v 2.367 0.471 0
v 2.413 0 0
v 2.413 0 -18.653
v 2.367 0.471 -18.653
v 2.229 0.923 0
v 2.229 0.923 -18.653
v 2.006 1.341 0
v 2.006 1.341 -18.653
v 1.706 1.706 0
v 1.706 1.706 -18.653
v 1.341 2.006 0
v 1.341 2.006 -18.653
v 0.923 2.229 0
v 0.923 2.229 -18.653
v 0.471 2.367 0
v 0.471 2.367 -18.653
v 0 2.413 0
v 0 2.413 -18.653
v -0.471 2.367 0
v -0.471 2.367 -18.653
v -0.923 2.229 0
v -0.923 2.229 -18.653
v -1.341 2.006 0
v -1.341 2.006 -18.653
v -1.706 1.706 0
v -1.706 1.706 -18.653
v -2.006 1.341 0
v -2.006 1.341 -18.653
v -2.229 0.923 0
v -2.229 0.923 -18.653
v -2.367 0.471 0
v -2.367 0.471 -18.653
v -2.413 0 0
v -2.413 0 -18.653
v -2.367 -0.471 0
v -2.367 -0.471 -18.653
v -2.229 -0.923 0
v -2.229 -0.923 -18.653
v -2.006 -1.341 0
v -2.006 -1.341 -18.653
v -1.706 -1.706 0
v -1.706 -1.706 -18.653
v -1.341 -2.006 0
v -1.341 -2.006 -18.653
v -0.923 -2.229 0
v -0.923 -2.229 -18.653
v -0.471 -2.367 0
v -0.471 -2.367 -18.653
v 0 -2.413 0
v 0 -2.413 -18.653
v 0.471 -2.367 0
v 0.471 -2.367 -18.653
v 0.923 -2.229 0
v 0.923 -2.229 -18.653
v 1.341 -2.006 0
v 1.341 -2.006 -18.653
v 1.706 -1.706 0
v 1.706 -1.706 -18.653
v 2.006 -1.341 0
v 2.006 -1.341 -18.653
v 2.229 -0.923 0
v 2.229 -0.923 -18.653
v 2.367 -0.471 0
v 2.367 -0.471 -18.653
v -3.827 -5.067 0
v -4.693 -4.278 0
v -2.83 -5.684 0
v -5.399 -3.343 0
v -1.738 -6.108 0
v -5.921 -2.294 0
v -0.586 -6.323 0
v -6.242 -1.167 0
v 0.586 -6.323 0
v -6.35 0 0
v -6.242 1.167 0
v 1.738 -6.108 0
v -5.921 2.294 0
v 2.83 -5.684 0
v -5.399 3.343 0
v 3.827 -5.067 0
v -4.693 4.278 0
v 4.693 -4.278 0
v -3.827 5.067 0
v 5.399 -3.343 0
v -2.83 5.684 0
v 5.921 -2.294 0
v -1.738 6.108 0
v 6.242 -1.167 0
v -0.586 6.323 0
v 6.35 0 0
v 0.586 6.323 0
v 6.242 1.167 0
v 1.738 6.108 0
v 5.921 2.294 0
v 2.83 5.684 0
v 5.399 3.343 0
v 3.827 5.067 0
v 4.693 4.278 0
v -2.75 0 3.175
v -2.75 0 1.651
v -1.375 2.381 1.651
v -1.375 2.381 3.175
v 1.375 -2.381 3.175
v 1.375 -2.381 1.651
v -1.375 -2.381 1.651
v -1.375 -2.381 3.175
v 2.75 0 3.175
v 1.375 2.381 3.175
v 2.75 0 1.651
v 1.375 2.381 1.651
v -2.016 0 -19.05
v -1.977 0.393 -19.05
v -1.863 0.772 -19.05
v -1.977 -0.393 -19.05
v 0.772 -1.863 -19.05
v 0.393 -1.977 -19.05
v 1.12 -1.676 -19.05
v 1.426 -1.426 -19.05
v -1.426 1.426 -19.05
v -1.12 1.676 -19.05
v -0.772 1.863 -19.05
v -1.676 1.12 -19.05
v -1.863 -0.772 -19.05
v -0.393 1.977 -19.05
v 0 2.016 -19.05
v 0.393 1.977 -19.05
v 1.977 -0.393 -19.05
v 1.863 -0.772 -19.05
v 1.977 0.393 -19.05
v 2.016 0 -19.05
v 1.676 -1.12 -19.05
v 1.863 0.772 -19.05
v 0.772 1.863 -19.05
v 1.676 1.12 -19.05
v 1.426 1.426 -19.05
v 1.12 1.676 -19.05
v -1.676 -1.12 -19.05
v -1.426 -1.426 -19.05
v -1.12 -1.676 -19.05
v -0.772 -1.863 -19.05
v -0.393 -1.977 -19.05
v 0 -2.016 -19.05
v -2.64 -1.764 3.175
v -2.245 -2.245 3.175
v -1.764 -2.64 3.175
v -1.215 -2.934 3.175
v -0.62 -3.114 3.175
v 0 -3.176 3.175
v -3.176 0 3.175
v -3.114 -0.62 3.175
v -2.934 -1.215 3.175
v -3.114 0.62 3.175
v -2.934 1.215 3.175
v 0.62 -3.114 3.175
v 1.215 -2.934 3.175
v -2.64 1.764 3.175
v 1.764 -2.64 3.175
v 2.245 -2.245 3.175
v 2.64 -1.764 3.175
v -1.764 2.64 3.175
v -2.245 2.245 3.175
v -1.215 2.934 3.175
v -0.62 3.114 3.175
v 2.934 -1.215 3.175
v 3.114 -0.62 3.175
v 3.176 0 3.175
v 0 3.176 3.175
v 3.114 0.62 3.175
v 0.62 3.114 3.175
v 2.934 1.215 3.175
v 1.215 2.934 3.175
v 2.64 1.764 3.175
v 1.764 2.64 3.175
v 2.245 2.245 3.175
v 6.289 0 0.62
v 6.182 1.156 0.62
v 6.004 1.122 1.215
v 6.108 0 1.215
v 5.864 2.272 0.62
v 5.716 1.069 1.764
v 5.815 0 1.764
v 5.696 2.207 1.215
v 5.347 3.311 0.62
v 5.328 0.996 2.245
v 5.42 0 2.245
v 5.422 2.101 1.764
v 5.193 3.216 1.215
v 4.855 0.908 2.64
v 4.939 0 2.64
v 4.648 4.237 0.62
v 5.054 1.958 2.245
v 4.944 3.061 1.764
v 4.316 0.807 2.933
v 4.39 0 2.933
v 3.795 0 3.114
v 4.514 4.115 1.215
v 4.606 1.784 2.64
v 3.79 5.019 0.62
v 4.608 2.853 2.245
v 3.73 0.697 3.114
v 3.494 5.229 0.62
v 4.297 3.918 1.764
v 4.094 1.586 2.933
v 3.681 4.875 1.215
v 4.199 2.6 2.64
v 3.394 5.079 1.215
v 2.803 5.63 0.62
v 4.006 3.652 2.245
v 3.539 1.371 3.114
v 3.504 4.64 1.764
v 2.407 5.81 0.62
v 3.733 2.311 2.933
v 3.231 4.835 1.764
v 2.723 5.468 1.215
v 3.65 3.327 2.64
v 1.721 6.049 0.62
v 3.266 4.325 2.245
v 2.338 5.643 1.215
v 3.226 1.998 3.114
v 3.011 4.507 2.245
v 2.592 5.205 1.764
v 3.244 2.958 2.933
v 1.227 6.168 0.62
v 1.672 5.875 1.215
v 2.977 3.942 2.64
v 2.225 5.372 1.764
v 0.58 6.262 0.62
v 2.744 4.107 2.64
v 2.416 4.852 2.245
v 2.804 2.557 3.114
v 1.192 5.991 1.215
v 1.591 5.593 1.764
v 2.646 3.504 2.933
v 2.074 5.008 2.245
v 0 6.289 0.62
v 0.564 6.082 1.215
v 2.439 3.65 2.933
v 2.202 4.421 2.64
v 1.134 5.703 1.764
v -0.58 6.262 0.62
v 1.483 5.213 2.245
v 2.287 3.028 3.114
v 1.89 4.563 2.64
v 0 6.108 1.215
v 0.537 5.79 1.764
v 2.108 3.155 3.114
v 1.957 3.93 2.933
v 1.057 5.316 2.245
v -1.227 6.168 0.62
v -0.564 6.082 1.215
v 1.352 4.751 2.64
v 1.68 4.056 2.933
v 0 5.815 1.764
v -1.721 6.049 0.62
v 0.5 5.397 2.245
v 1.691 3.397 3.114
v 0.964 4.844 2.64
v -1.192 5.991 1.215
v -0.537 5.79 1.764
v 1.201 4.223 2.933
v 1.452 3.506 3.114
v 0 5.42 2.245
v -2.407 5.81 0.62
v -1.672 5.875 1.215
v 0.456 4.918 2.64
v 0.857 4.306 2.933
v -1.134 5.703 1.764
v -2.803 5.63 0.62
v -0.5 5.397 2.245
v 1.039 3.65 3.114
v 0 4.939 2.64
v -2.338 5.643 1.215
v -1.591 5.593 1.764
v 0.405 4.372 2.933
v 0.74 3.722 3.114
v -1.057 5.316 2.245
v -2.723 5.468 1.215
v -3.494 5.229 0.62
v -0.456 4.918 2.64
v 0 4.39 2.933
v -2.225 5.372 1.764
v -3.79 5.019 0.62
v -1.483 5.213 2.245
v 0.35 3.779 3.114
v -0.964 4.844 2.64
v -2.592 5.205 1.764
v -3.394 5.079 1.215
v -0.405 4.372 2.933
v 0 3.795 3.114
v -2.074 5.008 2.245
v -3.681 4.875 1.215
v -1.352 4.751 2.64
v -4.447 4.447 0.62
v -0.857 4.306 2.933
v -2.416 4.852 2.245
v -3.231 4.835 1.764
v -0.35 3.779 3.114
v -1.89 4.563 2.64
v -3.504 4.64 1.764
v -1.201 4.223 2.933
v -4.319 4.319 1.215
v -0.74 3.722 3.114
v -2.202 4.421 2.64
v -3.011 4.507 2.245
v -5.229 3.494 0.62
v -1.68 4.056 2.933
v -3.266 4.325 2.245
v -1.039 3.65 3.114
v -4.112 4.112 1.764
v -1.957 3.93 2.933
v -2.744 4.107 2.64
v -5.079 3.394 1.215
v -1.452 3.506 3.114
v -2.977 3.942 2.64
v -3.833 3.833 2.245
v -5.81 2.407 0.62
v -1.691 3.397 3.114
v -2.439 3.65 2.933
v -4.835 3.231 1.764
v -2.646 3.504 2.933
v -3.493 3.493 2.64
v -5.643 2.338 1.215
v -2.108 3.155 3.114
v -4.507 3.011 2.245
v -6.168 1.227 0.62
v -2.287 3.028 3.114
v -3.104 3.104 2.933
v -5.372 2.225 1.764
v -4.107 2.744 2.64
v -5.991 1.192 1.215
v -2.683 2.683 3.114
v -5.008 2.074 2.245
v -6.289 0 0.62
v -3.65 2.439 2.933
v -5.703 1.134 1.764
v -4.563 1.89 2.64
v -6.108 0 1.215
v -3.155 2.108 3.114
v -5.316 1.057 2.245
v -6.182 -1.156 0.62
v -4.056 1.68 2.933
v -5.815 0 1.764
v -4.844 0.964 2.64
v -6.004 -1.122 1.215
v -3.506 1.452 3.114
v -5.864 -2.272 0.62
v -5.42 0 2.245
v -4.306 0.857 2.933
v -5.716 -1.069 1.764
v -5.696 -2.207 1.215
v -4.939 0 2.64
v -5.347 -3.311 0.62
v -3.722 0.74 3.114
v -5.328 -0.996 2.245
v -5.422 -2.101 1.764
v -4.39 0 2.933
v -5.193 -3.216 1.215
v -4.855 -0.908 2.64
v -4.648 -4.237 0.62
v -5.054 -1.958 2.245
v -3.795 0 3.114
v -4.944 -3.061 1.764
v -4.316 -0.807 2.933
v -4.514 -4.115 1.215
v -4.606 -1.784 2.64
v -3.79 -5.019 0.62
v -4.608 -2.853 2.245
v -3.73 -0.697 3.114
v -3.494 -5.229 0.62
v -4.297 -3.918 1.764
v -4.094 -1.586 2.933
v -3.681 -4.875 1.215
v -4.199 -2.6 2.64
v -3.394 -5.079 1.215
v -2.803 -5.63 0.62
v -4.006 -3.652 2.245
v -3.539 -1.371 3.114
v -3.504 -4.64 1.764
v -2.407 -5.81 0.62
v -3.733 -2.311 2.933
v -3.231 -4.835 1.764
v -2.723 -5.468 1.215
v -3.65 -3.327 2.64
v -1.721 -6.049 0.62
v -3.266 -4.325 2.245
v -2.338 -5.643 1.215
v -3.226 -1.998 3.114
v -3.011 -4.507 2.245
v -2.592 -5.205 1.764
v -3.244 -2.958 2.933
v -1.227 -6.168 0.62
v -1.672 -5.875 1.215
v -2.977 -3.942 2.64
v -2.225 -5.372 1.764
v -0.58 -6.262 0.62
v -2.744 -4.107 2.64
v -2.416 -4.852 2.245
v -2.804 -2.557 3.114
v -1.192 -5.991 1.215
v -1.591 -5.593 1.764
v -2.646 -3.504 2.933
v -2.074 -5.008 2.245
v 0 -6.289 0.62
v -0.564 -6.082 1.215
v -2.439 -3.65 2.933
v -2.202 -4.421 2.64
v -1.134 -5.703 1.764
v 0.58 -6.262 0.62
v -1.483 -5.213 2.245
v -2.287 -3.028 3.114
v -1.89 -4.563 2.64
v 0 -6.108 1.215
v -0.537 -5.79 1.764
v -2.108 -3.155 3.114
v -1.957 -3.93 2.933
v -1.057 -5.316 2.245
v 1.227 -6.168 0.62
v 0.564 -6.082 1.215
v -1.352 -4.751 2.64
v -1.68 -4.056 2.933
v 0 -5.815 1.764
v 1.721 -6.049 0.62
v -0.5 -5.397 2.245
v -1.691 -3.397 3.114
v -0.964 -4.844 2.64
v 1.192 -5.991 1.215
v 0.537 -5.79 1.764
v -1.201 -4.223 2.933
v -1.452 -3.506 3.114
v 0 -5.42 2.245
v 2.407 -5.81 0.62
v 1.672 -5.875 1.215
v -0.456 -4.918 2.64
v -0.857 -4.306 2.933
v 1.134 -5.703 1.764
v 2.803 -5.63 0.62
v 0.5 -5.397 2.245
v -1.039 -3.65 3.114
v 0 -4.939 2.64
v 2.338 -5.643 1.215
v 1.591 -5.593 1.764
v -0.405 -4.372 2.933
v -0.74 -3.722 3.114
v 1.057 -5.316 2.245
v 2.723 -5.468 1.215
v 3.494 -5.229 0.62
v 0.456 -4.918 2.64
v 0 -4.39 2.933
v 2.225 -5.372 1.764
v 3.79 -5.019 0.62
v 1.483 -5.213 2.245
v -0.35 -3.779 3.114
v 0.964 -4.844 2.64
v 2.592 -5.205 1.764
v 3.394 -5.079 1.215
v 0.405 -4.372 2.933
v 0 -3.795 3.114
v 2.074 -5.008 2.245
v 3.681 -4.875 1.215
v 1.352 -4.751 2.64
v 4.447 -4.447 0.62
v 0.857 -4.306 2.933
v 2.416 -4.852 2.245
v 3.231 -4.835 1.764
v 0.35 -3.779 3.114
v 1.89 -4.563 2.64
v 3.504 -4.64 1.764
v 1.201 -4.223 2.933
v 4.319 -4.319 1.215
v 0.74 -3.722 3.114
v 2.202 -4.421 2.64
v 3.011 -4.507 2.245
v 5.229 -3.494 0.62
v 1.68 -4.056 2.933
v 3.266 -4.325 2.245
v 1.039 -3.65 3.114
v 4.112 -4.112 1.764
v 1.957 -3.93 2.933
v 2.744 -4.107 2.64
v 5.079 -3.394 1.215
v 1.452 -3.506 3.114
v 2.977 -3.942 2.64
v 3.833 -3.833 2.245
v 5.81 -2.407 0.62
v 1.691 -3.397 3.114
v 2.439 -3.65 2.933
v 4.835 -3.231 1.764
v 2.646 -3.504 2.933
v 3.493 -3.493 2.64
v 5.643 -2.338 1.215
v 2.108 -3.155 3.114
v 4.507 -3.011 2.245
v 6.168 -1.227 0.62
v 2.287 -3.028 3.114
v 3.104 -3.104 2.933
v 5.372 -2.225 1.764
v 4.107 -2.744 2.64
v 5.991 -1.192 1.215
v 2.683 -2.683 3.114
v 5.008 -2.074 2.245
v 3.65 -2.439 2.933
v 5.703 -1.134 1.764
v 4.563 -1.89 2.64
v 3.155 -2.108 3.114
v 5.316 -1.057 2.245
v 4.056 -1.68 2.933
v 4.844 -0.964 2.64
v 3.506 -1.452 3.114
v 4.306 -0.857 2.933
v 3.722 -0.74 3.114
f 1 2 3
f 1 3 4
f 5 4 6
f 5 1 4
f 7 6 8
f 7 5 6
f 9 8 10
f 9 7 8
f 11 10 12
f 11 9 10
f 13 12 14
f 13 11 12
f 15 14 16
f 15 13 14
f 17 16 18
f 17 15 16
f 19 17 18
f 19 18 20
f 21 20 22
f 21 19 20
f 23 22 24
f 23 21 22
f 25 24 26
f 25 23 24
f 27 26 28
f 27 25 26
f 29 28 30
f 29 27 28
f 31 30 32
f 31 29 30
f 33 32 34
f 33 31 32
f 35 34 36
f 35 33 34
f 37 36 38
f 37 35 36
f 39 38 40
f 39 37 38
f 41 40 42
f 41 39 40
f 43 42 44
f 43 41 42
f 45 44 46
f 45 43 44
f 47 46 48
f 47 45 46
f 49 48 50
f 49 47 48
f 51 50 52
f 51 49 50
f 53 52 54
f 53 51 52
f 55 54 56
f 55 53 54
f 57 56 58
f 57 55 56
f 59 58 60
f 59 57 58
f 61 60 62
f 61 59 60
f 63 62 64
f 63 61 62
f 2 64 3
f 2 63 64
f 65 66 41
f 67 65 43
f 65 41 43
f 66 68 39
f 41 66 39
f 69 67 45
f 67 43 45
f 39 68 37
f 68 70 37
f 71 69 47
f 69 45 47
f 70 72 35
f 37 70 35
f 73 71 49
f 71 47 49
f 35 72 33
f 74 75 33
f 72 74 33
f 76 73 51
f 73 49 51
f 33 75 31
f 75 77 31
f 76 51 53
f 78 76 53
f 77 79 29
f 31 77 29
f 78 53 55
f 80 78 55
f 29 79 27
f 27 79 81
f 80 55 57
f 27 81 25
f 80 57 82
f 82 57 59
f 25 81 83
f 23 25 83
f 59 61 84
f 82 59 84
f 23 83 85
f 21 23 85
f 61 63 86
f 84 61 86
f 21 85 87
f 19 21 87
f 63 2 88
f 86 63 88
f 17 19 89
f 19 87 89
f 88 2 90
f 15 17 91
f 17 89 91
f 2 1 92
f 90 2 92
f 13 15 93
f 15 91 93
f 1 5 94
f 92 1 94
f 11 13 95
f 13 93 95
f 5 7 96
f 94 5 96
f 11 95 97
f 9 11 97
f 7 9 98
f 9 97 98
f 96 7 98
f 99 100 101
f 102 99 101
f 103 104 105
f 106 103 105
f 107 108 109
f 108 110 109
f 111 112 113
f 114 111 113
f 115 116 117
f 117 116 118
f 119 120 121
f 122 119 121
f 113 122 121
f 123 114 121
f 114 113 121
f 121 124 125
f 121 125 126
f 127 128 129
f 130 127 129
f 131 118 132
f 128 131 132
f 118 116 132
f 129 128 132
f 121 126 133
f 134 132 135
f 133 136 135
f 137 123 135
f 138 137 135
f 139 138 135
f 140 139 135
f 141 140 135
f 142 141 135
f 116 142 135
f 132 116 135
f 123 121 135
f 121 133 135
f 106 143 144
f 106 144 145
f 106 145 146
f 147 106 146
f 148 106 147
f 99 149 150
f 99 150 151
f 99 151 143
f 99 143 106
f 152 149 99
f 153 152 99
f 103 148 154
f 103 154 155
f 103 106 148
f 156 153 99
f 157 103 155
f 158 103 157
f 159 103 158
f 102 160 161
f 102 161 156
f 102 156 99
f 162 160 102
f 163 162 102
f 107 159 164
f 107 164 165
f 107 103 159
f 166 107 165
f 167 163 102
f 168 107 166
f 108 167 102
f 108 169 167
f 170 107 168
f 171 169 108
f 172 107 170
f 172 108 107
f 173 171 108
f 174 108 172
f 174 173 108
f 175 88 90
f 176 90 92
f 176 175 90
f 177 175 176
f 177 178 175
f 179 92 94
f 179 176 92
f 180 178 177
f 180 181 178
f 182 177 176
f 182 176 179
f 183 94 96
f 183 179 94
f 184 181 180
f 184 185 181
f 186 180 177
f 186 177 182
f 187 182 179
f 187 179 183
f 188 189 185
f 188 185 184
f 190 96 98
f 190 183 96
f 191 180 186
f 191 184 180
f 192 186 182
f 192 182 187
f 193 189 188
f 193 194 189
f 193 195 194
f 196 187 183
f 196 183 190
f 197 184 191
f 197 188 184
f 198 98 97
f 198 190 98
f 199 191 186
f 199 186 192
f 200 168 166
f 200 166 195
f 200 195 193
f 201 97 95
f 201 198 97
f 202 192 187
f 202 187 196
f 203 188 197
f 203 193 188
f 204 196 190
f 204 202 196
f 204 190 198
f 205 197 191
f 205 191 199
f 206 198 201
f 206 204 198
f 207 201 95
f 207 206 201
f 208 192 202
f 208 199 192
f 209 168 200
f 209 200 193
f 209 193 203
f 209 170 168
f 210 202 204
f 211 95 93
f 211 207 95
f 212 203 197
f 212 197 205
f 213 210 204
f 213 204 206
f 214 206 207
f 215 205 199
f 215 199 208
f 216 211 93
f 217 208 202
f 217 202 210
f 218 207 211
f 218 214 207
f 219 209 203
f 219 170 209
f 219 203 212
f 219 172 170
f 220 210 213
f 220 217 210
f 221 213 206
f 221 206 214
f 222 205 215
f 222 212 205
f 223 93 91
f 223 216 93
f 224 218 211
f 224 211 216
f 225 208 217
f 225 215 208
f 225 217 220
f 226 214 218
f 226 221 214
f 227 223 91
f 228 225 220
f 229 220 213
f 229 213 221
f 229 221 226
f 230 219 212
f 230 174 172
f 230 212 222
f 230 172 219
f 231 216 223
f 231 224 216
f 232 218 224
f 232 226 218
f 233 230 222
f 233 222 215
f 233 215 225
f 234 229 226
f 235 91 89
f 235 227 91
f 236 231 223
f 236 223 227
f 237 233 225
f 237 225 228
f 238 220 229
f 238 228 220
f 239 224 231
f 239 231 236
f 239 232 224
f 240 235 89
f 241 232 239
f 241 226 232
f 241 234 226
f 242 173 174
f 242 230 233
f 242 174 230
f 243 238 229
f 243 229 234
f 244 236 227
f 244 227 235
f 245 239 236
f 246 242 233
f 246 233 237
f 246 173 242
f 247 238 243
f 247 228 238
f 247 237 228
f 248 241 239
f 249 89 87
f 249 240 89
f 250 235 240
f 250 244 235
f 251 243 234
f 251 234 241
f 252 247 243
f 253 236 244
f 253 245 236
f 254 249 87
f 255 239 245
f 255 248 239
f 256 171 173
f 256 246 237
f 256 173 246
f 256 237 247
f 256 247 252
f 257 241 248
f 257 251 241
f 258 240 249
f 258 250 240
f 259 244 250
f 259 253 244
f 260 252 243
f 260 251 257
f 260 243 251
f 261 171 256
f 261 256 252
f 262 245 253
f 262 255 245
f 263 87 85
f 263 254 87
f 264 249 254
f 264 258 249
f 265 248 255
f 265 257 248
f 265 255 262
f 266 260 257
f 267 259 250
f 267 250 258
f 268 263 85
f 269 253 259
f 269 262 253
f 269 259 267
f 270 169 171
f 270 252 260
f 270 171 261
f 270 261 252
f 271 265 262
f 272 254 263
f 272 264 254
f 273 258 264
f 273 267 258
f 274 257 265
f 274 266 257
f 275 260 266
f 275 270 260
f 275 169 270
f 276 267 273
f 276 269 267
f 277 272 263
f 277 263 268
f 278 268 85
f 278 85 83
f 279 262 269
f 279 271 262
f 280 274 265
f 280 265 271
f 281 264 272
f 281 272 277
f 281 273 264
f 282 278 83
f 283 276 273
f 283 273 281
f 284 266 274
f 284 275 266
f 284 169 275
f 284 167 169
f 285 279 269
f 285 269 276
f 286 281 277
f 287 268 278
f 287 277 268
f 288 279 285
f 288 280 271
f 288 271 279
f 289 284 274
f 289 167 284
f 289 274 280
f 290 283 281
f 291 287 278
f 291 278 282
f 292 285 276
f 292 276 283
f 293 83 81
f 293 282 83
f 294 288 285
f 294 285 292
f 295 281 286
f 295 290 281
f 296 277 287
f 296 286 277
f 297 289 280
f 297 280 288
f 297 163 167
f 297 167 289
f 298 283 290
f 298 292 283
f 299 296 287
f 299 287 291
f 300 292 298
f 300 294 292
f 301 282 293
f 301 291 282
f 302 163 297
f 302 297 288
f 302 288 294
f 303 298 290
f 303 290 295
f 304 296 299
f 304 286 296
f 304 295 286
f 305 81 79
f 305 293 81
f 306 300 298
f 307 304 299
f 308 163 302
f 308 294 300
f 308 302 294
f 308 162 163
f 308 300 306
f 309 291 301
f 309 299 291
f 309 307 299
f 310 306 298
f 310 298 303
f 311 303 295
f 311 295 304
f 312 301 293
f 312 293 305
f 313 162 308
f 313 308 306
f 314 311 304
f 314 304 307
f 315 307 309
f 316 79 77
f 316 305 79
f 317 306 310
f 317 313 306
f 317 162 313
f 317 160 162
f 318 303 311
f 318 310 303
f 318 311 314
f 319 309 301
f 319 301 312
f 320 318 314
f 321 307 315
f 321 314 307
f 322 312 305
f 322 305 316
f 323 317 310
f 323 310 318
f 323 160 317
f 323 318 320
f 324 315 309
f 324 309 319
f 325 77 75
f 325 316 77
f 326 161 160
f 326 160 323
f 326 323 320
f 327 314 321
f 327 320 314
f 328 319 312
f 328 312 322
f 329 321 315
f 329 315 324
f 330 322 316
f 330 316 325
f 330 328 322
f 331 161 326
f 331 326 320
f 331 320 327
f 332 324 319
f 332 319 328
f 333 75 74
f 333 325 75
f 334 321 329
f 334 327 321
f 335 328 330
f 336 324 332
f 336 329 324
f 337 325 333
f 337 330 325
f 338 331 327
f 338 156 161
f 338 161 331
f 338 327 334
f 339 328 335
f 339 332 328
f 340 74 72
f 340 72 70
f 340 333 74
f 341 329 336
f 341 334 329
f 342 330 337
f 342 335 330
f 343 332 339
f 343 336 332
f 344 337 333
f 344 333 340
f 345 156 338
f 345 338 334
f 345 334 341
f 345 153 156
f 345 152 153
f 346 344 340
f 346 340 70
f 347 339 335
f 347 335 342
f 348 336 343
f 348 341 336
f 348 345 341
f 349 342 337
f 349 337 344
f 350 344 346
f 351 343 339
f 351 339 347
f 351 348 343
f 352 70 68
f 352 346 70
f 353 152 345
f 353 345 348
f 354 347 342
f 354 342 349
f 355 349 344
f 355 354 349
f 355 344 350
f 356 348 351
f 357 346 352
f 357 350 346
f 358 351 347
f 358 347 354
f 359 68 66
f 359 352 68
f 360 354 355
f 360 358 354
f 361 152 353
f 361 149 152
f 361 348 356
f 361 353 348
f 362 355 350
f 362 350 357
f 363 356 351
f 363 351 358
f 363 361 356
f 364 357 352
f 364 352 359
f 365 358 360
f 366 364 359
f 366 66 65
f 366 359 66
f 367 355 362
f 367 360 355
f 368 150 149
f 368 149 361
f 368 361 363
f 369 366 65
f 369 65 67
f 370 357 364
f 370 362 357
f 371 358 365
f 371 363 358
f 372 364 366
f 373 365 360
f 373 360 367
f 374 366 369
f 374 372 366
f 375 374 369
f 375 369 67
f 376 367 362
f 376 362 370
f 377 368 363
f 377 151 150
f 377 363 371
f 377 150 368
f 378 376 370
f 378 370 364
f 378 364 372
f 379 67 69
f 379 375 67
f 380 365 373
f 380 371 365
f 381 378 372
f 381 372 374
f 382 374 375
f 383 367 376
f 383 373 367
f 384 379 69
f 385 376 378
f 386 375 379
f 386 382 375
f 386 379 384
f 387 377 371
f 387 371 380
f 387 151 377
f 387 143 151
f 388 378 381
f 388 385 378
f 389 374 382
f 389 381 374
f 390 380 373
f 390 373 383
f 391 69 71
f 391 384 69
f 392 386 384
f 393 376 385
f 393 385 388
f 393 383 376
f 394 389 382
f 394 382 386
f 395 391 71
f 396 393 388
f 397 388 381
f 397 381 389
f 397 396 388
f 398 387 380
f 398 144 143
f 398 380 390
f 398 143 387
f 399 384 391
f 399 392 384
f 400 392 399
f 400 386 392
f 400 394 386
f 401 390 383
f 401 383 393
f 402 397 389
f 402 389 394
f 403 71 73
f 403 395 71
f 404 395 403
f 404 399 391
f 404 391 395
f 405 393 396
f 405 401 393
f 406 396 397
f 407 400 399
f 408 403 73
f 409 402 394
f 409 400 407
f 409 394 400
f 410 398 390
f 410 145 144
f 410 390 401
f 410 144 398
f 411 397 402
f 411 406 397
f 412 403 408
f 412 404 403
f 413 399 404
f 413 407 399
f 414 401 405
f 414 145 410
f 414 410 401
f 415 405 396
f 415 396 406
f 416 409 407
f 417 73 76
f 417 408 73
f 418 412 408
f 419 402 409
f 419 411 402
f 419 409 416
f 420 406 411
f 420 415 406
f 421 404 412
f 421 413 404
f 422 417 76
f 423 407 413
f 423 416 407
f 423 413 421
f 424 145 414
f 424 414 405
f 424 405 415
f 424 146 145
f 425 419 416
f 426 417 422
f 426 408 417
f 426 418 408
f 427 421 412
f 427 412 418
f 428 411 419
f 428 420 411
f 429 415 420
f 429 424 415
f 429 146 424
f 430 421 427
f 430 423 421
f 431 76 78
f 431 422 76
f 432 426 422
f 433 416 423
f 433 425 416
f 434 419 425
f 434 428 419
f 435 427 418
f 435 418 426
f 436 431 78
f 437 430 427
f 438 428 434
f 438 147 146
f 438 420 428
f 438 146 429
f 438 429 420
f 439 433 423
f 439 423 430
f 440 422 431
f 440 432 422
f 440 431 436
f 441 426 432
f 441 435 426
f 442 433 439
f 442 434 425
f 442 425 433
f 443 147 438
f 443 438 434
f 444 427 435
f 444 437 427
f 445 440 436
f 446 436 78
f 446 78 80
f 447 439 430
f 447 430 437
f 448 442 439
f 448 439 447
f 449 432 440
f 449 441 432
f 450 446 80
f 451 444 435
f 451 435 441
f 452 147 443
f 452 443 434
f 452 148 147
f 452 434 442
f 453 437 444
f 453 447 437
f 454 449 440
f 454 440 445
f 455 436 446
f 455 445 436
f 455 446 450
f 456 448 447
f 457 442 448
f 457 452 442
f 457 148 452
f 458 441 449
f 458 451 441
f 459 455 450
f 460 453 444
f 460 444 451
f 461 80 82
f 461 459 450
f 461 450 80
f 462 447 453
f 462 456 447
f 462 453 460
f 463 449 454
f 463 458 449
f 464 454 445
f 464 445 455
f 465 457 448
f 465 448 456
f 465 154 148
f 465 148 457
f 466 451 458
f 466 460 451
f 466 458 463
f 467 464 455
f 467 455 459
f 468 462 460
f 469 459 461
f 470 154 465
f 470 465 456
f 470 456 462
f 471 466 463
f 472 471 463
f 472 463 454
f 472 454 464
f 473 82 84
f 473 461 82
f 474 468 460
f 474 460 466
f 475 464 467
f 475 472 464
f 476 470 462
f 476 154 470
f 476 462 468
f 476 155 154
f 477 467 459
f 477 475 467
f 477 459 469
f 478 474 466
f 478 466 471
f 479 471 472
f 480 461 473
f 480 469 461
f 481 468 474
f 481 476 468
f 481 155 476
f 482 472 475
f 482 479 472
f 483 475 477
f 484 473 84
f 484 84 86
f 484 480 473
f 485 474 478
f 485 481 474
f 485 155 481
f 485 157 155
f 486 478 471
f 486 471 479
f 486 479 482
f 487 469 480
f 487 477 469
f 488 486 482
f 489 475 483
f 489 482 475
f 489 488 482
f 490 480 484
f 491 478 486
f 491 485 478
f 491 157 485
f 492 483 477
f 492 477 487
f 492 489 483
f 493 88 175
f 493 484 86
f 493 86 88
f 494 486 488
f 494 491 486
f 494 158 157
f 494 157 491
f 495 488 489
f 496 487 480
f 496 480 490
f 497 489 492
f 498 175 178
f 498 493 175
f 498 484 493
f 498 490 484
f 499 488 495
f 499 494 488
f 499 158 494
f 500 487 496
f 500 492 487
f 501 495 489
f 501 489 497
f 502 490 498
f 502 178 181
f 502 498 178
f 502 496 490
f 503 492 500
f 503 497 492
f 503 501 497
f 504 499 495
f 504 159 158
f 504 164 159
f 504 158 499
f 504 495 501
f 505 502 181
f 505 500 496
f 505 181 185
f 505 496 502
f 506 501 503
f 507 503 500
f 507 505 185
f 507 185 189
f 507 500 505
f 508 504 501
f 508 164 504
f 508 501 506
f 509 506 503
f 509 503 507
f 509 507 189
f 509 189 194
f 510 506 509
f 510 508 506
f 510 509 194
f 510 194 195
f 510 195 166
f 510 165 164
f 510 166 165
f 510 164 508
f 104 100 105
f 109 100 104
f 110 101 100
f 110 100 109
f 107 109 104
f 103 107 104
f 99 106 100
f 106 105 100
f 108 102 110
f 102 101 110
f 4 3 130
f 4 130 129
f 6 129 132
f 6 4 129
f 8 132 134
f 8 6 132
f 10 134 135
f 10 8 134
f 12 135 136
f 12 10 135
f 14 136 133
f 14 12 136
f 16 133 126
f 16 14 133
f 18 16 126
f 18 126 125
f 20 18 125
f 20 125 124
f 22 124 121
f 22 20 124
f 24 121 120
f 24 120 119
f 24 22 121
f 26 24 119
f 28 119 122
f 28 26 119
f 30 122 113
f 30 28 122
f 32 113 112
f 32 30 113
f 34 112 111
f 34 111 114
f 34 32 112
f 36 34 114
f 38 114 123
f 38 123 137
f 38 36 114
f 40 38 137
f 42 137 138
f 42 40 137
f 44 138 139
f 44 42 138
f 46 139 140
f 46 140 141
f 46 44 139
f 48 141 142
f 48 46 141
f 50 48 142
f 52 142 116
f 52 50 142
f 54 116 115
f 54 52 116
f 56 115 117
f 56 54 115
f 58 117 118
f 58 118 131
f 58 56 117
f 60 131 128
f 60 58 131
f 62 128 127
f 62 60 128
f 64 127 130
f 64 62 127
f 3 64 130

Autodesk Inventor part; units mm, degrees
ref_plane "YZ Plane" through (0, 0, 0) normal (1, 0, 0) x (0, 1, 0)
ref_plane "XZ Plane" through (0, 0, 0) normal (0, 1, 0) x (-1, 0, 0)
ref_plane "XY Plane" through (0, 0, 0) normal (0, 0, 1) x (1, 0, 0)
sketch "Sketch1" plane through (0, 0, 0) normal (0, 0, 1) x (1, 0, 0)
  circle A0 centre (0, 0) radius 2.413
  circle A1 centre (0, 0) radius 6.35
  line L0 (1.3748, 2.3813) -> (2.7496, 0)
  line L1 (2.7496, 0) -> (1.3748, -2.3812)
  line L2 (1.3748, -2.3812) -> (-1.3748, -2.3812)
  line L3 (-1.3748, -2.3812) -> (-2.7496, 0)
  line L4 (-2.7496, 0) -> (-1.3748, 2.3813)
  line L5 (-1.3748, 2.3813) -> (1.3748, 2.3813)
  dimension "d0" = 4.826
  dimension "d1" = 12.7
  dimension "d2" = 4.7625
extrude "Extrusion1" add sketch "Sketch1" against normal blind 19.05 contours A0 L1 L2 L3 L4 L5 L0 | L0 A0 | A0 L1 | L5 A0 | A0 L2 | L4 A0 | A0 L3
extrude "Extrusion2" add sketch "Sketch1" along normal blind 3.175 contours L0 A0 | A0 L1 | L5 A0 | A0 L2 | L4 A0 | A0 L3 | A1
extrude "Extrusion3" add sketch "Sketch1" along normal blind 1.651 contours A0 L1 L2 L3 L4 L5 L0 | A0 L0 L1 | A0 L5 L0 | L1 L2 A0 | A0 L4 L5 | L2 L3 A0 | A0 L3 L4
thread "Thread1" size "10-32 UNF" class "2A" standard "ANSI Unified Screw Threads" full length
chamfer "Chamfer1" distance 0.3969 angle 45 1 edges at (-2.413, 0, -19.05)
fillet "Fillet1" radius 3.175 1 edges at (-6.35, 0, 3.175)
properties part number "10 32 bolt 0.75"
